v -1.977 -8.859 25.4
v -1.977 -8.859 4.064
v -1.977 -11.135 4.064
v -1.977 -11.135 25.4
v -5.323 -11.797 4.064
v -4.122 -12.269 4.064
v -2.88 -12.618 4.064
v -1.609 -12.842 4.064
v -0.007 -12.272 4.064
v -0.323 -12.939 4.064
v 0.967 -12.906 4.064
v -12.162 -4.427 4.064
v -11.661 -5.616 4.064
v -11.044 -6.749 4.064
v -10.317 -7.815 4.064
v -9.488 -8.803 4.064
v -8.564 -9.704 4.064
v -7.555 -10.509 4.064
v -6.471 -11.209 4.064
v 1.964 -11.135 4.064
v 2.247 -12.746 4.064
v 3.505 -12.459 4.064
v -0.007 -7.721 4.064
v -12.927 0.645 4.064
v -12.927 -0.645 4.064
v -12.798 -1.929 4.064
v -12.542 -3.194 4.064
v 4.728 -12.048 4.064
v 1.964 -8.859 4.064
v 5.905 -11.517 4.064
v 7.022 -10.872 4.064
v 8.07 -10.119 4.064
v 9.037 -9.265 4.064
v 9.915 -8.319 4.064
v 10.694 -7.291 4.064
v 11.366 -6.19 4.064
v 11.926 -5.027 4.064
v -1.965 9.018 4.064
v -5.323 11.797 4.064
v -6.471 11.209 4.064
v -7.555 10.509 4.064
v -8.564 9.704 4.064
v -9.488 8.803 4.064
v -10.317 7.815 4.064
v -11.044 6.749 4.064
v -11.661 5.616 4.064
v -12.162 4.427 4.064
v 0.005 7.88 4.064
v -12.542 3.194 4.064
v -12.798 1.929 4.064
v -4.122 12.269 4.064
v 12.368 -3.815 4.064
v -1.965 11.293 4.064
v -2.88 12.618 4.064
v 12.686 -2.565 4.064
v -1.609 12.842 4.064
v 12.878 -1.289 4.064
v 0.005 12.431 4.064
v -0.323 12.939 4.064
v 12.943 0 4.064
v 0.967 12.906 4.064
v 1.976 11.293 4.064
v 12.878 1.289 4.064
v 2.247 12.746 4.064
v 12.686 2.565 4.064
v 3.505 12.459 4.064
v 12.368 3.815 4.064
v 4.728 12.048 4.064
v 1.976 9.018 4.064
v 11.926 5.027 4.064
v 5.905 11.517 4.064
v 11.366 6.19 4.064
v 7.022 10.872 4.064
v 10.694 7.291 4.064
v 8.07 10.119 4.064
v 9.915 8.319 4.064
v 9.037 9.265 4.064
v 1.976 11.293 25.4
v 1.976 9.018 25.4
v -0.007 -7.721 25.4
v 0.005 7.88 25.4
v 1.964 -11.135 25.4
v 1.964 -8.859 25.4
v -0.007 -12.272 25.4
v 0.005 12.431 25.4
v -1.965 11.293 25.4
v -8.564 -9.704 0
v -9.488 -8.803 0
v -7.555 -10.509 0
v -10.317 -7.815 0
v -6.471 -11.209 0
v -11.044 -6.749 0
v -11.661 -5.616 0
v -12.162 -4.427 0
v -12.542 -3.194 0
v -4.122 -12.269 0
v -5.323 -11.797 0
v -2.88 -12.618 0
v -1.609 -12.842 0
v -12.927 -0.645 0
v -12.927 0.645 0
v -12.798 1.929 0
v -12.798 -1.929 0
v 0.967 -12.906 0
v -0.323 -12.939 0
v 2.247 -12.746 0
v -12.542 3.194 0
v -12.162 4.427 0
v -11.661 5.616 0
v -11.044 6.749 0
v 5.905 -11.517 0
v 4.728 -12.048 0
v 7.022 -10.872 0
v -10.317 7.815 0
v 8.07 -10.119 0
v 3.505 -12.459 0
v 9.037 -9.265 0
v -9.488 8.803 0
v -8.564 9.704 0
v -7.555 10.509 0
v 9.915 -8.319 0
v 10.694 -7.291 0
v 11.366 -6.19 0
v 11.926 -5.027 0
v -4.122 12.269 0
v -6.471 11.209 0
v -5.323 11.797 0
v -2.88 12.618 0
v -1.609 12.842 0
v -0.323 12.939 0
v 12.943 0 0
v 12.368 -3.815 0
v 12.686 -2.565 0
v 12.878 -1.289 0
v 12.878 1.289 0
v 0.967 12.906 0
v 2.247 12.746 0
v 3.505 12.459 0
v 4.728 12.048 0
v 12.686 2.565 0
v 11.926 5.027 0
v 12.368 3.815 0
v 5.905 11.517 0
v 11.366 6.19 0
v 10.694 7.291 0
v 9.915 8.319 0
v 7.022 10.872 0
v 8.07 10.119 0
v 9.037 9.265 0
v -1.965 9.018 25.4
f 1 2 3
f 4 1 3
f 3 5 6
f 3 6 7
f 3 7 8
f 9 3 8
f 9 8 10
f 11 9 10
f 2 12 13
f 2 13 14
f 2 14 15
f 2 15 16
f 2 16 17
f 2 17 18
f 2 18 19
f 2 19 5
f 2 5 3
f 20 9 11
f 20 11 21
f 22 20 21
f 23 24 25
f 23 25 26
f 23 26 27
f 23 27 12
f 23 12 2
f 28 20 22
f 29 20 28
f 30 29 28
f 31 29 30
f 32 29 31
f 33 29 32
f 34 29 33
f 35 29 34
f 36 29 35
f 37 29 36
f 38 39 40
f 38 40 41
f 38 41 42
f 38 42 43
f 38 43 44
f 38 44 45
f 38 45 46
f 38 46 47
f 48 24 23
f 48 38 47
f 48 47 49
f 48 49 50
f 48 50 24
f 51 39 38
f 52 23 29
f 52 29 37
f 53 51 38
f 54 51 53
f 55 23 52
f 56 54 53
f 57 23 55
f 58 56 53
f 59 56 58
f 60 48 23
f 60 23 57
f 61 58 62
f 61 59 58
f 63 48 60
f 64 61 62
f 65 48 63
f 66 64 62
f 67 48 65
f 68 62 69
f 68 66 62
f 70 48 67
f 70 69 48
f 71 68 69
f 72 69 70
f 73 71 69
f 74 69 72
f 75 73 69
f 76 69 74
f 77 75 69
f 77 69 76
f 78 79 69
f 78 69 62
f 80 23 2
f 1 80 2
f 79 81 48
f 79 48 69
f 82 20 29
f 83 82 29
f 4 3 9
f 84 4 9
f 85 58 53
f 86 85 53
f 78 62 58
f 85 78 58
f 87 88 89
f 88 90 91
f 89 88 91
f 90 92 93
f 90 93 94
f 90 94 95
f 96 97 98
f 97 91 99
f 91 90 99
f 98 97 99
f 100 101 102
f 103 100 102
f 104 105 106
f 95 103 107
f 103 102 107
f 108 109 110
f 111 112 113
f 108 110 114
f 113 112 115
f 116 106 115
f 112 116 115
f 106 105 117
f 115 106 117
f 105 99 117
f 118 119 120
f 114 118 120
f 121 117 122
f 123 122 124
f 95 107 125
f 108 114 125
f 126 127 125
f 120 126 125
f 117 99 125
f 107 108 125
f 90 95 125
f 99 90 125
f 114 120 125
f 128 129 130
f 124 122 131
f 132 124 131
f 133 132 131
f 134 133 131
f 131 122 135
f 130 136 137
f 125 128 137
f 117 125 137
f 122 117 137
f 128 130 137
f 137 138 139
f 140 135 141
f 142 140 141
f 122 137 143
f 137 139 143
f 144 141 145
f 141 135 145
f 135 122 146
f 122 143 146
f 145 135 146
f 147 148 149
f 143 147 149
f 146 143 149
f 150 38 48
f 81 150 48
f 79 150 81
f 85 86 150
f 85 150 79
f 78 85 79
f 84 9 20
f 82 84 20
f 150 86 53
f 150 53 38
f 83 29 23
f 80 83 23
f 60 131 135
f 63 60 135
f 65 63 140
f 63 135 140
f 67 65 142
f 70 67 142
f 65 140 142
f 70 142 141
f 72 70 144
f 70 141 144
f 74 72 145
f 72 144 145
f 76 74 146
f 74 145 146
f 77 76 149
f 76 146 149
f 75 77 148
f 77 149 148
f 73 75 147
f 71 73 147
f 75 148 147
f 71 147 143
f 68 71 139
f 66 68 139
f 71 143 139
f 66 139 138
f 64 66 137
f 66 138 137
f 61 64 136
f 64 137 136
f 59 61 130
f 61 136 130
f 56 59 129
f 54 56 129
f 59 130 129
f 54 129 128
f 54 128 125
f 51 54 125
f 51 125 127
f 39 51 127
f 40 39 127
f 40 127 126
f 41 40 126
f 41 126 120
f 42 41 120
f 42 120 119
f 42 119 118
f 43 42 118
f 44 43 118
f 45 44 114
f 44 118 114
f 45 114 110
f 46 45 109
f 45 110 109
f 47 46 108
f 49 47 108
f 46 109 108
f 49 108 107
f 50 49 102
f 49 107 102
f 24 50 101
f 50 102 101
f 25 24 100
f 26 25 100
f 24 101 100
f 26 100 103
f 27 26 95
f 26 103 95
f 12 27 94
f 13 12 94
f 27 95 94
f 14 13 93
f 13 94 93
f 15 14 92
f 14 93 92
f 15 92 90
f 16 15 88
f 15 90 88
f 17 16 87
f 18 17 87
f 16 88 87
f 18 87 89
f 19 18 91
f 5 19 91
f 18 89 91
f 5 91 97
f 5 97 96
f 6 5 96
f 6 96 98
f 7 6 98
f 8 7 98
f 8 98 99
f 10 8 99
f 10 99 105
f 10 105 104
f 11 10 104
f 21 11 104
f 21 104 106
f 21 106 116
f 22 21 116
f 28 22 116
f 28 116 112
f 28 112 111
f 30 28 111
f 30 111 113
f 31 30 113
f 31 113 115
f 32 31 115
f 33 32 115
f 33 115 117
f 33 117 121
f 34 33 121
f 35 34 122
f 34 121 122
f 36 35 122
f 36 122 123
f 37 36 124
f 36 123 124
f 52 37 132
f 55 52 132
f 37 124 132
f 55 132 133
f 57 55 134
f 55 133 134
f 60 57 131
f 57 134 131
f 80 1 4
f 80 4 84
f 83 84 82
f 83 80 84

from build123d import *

# Parameters (mm, degrees)
F0_R     = 12.942623
F1_DEPTH = 4.064
F4_DEPTH = 25.4
F5_DEPTH = 25.4


with BuildPart() as f1:
    # F0 (on Top) → F1 (new body)
    with BuildSketch(Plane.XY):
        Circle(F0_R)
    extrude(amount=F1_DEPTH)

    # F2 (on Top) → F4 (join)
    with BuildSketch(Plane.XY):
        Polygon((1.975973, 9.017531), (1.975973, 11.293087), (0.005284, 12.430865), (-1.965406, 11.293087), (-1.965406, 9.017531), (0.005284, 7.879752), align=None)
    extrude(amount=F4_DEPTH)

    # F3 (on face) → F5 (join)
    with BuildSketch(Plane.XY):
        Polygon((1.963999, -11.134515), (1.963999, -8.858958), (-0.006691, -7.72118), (-1.977381, -8.858958), (-1.977381, -11.134515), (-0.006691, -12.272293), align=None)
    extrude(amount=F5_DEPTH)


solid = f1.part
